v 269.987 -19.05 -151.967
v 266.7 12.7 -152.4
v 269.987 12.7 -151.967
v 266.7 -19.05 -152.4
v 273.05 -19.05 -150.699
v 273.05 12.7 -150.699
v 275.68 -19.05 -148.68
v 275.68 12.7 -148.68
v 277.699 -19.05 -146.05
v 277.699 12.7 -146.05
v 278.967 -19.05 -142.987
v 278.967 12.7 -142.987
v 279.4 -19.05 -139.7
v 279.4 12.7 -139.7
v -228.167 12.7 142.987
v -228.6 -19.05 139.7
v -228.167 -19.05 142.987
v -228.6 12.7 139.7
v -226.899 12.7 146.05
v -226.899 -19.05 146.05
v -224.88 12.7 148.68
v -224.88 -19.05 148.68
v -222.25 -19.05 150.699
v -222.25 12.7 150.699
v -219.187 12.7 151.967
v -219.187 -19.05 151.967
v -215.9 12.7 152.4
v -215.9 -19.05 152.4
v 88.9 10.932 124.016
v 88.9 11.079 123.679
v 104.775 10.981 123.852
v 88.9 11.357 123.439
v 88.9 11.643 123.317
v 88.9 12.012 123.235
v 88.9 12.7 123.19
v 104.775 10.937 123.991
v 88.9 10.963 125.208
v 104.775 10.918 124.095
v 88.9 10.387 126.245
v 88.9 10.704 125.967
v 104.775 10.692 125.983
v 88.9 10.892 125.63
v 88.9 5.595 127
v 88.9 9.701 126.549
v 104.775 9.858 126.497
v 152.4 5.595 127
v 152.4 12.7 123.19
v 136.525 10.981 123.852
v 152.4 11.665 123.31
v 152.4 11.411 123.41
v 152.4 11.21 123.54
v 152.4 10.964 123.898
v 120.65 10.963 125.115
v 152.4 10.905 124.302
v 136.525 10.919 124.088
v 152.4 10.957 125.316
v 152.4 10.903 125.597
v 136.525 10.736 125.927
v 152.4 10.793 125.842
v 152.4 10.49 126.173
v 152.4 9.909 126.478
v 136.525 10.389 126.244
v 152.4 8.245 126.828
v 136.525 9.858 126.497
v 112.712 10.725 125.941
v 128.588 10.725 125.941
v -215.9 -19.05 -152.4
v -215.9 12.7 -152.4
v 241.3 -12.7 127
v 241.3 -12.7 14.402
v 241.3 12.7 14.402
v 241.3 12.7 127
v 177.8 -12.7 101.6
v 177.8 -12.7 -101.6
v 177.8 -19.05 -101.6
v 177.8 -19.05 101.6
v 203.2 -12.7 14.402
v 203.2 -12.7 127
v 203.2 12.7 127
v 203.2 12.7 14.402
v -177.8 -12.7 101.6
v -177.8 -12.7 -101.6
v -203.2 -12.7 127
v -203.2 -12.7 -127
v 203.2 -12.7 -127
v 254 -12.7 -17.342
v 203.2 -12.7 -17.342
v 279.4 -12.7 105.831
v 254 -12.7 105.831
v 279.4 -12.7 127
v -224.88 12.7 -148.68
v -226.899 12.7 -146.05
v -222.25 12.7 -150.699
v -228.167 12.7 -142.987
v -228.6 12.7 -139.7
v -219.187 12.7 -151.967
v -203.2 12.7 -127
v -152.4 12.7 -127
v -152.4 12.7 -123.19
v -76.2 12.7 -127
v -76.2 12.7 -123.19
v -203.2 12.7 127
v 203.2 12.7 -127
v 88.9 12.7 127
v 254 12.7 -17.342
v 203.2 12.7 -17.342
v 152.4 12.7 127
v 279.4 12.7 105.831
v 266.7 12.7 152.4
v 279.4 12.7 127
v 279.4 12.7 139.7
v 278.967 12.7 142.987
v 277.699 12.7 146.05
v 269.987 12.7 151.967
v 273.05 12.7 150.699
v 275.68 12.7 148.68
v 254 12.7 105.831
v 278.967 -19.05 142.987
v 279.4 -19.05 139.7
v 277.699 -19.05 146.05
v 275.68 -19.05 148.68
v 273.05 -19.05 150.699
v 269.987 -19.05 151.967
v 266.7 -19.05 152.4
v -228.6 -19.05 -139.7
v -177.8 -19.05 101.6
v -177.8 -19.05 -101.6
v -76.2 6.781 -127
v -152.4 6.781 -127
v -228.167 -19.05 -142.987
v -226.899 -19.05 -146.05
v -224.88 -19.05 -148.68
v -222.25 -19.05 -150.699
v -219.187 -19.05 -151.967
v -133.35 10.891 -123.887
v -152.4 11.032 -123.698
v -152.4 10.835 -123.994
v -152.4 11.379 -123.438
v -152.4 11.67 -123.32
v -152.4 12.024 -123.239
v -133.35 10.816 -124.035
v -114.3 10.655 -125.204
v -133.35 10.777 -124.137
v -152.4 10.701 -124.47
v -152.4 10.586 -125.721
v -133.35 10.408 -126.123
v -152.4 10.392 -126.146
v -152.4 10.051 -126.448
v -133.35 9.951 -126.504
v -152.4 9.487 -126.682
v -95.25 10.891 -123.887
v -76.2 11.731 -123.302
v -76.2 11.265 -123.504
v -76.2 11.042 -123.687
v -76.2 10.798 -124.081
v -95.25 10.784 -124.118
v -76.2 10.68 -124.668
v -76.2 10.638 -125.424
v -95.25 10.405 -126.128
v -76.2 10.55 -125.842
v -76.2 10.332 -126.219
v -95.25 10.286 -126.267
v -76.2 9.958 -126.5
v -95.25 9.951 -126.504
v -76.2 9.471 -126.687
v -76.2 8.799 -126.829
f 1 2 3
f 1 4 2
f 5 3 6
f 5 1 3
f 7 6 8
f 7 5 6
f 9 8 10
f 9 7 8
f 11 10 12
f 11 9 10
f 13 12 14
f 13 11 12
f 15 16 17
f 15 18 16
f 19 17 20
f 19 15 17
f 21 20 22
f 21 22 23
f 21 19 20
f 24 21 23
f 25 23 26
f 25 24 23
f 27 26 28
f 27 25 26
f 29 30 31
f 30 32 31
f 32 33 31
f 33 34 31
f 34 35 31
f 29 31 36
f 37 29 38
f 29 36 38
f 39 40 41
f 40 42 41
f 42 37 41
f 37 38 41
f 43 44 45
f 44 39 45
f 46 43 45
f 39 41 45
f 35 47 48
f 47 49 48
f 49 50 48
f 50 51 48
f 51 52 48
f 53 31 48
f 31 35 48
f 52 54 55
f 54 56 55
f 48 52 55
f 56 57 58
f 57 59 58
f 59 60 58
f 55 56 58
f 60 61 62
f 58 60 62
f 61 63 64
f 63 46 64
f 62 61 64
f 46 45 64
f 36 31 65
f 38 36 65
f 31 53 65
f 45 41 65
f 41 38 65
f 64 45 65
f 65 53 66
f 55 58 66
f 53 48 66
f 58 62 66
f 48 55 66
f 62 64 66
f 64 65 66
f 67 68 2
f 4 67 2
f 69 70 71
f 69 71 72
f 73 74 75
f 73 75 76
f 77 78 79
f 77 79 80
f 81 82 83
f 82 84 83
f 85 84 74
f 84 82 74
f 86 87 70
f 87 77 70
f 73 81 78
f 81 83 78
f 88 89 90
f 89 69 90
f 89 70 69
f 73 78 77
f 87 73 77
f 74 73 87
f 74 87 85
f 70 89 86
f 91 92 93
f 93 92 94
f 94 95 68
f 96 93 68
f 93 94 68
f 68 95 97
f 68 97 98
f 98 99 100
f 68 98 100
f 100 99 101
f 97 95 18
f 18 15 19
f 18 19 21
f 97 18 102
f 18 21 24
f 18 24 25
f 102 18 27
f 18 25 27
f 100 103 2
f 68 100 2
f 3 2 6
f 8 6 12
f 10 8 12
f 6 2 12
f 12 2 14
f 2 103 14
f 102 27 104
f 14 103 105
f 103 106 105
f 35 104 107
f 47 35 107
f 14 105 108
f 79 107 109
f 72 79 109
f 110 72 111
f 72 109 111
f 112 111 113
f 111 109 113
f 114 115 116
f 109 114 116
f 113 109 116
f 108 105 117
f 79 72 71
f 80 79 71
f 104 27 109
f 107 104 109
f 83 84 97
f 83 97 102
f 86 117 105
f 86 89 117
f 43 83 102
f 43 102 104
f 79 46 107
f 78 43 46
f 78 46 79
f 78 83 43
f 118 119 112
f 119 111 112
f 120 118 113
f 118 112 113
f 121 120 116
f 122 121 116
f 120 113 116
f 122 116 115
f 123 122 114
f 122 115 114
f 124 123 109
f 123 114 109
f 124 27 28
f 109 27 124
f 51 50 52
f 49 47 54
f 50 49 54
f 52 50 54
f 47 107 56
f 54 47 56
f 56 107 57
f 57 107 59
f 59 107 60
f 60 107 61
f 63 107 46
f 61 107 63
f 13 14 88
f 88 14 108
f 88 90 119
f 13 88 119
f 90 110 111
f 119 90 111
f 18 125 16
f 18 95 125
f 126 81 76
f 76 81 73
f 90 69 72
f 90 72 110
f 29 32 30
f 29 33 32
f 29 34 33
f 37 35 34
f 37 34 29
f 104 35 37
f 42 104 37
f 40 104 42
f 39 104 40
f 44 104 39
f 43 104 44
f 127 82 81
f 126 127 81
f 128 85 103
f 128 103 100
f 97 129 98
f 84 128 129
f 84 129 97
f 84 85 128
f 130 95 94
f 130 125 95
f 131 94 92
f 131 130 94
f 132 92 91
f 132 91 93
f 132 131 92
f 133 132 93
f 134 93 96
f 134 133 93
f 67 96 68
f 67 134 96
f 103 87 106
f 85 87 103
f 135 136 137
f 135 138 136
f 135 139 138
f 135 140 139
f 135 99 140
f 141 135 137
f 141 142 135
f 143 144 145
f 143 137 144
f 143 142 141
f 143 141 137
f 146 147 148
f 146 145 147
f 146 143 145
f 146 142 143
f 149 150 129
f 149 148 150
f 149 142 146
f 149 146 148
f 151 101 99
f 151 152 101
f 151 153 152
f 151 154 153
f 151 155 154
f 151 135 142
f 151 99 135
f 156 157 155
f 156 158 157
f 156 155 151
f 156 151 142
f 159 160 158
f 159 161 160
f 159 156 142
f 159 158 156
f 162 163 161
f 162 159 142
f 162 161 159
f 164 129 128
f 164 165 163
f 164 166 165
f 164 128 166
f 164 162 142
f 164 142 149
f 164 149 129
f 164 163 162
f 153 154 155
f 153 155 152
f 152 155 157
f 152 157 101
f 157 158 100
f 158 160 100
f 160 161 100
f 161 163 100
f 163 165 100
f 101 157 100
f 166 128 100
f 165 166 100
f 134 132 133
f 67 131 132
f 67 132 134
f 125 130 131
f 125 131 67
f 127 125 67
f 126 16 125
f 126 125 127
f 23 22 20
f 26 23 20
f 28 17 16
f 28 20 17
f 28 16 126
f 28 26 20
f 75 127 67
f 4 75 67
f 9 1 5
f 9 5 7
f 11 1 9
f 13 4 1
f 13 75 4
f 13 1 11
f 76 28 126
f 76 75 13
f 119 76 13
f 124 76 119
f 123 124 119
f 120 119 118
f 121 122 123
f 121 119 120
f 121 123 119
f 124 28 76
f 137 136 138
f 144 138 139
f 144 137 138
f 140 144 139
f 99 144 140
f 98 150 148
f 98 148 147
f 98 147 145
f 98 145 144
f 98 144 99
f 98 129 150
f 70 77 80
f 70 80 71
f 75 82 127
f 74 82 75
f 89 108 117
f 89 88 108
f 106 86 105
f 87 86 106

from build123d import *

# Parameters (mm, degrees)
F1_DEPTH      = 12.7
F2_W          = 508
F2_H          = 304.8
F2_W_2        = 355.6
F2_H_2        = 203.2
F3_DEPTH      = 6.35
F4_R          = 12.7
F5_W          = 76.2
F5_H          = 25.4
F6_DEPTH      = 3.81
F6_DEPTH_BACK = 25.4
F8_DEPTH      = 87.376
F9_W          = 63.5
F9_H          = 25.4
F10_DEPTH     = 3.81
F12_DEPTH     = 76.2


with BuildPart() as f1:
    # F0 (on Front) → F1 (new body, symmetric)
    with BuildSketch(Plane.XZ):
        Polygon((254, -17.3418857157), (203.2, -17.3418857157), (203.2, -127), (-203.2, -127), (-203.2, 127), (203.2, 127), (203.2, 14.4019788131), (241.3, 14.4019788131), (241.3, 127), (279.4, 127), (279.4, 152.4), (254, 152.4), (241.3, 152.4), (-228.6, 152.4), (-228.6, -152.4), (279.4, -152.4), (279.4, 105.8309227228), (254, 105.8309227228), (254, 0), align=None)
    extrude(amount=F1_DEPTH, both=True)

    # F2 (on face) → F3 (join)
    with BuildSketch(Plane.XZ.offset(12.7)):
        with Locations((25.4, 0)):
            Rectangle(F2_W, F2_H)
        Rectangle(F2_W_2, F2_H_2, mode=Mode.SUBTRACT)
    extrude(amount=F3_DEPTH)

    # F4
    f4_edges = [f1.edges().sort_by_distance(p)[0] for p in [
        (279.4, -3.175, -152.4),
        (-228.6, -3.175, -152.4),
        (-228.6, -3.175, 152.4),
        (279.4, -3.175, 152.4),
    ]]
    fillet(f4_edges, radius=F4_R)

    # F5 (on face) → F6 (join, two sides)
    with BuildSketch(Plane.XY.offset(-127)) as f6_sk:
        with Locations((-114.3, 0)):
            Rectangle(F5_W, F5_H)
    extrude(amount=F6_DEPTH)
    extrude(f6_sk.sketch, amount=-F6_DEPTH_BACK)

    # F7 (on face) → F8 (cut)
    with BuildSketch(Plane.YZ.offset(-76.2)):
        with BuildLine():
            add(Edge.make_bspline(
                [(12.7, -123.19), (10.5594976368, -123.19), (10.9031747427, -126.1164686911), (10.1332584811, -126.8581633475), (6.7809096129, -127)],
                knots=[0, 0, 0, 0, 0.2592828913, 0.6394583018, 0.6394583018, 0.6394583018, 0.6394583018], degree=3))
            Line((12.7, -123.19), (-12.7, -123.19))
            Line((-12.7, -123.19), (-12.7, -127))
            Line((-12.7, -127), (6.7809096129, -127))
        make_face()
    extrude(amount=-F8_DEPTH, mode=Mode.SUBTRACT)

    # F9 (on face) → F10 (join)
    with BuildSketch(Plane(origin=(0, 0, 127), x_dir=(1, 0, 0), z_dir=(0, 0, -1))):
        with Locations((120.65, 0)):
            Rectangle(F9_W, F9_H)
    extrude(amount=F10_DEPTH)

    # F11 (on face) → F12 (cut)
    with BuildSketch(Plane.YZ.offset(152.4)):
        with BuildLine():
            Line((-12.7, 123.19), (12.7, 123.19))
            add(Edge.make_bspline(
                [(12.7, 123.19), (10.4529513046, 123.19), (11.7430118211, 126.146945185), (9.7733114077, 126.8663682916), (5.5950677895, 127)],
                knots=[0, 0, 0, 0, 0.2484068186, 0.6533950313, 0.6533950313, 0.6533950313, 0.6533950313], degree=3))
            Line((5.5950677895, 127), (-12.7, 127))
            Line((-12.7, 127), (-12.7, 123.19))
        make_face()
    extrude(amount=-F12_DEPTH, mode=Mode.SUBTRACT)


solid = f1.part
